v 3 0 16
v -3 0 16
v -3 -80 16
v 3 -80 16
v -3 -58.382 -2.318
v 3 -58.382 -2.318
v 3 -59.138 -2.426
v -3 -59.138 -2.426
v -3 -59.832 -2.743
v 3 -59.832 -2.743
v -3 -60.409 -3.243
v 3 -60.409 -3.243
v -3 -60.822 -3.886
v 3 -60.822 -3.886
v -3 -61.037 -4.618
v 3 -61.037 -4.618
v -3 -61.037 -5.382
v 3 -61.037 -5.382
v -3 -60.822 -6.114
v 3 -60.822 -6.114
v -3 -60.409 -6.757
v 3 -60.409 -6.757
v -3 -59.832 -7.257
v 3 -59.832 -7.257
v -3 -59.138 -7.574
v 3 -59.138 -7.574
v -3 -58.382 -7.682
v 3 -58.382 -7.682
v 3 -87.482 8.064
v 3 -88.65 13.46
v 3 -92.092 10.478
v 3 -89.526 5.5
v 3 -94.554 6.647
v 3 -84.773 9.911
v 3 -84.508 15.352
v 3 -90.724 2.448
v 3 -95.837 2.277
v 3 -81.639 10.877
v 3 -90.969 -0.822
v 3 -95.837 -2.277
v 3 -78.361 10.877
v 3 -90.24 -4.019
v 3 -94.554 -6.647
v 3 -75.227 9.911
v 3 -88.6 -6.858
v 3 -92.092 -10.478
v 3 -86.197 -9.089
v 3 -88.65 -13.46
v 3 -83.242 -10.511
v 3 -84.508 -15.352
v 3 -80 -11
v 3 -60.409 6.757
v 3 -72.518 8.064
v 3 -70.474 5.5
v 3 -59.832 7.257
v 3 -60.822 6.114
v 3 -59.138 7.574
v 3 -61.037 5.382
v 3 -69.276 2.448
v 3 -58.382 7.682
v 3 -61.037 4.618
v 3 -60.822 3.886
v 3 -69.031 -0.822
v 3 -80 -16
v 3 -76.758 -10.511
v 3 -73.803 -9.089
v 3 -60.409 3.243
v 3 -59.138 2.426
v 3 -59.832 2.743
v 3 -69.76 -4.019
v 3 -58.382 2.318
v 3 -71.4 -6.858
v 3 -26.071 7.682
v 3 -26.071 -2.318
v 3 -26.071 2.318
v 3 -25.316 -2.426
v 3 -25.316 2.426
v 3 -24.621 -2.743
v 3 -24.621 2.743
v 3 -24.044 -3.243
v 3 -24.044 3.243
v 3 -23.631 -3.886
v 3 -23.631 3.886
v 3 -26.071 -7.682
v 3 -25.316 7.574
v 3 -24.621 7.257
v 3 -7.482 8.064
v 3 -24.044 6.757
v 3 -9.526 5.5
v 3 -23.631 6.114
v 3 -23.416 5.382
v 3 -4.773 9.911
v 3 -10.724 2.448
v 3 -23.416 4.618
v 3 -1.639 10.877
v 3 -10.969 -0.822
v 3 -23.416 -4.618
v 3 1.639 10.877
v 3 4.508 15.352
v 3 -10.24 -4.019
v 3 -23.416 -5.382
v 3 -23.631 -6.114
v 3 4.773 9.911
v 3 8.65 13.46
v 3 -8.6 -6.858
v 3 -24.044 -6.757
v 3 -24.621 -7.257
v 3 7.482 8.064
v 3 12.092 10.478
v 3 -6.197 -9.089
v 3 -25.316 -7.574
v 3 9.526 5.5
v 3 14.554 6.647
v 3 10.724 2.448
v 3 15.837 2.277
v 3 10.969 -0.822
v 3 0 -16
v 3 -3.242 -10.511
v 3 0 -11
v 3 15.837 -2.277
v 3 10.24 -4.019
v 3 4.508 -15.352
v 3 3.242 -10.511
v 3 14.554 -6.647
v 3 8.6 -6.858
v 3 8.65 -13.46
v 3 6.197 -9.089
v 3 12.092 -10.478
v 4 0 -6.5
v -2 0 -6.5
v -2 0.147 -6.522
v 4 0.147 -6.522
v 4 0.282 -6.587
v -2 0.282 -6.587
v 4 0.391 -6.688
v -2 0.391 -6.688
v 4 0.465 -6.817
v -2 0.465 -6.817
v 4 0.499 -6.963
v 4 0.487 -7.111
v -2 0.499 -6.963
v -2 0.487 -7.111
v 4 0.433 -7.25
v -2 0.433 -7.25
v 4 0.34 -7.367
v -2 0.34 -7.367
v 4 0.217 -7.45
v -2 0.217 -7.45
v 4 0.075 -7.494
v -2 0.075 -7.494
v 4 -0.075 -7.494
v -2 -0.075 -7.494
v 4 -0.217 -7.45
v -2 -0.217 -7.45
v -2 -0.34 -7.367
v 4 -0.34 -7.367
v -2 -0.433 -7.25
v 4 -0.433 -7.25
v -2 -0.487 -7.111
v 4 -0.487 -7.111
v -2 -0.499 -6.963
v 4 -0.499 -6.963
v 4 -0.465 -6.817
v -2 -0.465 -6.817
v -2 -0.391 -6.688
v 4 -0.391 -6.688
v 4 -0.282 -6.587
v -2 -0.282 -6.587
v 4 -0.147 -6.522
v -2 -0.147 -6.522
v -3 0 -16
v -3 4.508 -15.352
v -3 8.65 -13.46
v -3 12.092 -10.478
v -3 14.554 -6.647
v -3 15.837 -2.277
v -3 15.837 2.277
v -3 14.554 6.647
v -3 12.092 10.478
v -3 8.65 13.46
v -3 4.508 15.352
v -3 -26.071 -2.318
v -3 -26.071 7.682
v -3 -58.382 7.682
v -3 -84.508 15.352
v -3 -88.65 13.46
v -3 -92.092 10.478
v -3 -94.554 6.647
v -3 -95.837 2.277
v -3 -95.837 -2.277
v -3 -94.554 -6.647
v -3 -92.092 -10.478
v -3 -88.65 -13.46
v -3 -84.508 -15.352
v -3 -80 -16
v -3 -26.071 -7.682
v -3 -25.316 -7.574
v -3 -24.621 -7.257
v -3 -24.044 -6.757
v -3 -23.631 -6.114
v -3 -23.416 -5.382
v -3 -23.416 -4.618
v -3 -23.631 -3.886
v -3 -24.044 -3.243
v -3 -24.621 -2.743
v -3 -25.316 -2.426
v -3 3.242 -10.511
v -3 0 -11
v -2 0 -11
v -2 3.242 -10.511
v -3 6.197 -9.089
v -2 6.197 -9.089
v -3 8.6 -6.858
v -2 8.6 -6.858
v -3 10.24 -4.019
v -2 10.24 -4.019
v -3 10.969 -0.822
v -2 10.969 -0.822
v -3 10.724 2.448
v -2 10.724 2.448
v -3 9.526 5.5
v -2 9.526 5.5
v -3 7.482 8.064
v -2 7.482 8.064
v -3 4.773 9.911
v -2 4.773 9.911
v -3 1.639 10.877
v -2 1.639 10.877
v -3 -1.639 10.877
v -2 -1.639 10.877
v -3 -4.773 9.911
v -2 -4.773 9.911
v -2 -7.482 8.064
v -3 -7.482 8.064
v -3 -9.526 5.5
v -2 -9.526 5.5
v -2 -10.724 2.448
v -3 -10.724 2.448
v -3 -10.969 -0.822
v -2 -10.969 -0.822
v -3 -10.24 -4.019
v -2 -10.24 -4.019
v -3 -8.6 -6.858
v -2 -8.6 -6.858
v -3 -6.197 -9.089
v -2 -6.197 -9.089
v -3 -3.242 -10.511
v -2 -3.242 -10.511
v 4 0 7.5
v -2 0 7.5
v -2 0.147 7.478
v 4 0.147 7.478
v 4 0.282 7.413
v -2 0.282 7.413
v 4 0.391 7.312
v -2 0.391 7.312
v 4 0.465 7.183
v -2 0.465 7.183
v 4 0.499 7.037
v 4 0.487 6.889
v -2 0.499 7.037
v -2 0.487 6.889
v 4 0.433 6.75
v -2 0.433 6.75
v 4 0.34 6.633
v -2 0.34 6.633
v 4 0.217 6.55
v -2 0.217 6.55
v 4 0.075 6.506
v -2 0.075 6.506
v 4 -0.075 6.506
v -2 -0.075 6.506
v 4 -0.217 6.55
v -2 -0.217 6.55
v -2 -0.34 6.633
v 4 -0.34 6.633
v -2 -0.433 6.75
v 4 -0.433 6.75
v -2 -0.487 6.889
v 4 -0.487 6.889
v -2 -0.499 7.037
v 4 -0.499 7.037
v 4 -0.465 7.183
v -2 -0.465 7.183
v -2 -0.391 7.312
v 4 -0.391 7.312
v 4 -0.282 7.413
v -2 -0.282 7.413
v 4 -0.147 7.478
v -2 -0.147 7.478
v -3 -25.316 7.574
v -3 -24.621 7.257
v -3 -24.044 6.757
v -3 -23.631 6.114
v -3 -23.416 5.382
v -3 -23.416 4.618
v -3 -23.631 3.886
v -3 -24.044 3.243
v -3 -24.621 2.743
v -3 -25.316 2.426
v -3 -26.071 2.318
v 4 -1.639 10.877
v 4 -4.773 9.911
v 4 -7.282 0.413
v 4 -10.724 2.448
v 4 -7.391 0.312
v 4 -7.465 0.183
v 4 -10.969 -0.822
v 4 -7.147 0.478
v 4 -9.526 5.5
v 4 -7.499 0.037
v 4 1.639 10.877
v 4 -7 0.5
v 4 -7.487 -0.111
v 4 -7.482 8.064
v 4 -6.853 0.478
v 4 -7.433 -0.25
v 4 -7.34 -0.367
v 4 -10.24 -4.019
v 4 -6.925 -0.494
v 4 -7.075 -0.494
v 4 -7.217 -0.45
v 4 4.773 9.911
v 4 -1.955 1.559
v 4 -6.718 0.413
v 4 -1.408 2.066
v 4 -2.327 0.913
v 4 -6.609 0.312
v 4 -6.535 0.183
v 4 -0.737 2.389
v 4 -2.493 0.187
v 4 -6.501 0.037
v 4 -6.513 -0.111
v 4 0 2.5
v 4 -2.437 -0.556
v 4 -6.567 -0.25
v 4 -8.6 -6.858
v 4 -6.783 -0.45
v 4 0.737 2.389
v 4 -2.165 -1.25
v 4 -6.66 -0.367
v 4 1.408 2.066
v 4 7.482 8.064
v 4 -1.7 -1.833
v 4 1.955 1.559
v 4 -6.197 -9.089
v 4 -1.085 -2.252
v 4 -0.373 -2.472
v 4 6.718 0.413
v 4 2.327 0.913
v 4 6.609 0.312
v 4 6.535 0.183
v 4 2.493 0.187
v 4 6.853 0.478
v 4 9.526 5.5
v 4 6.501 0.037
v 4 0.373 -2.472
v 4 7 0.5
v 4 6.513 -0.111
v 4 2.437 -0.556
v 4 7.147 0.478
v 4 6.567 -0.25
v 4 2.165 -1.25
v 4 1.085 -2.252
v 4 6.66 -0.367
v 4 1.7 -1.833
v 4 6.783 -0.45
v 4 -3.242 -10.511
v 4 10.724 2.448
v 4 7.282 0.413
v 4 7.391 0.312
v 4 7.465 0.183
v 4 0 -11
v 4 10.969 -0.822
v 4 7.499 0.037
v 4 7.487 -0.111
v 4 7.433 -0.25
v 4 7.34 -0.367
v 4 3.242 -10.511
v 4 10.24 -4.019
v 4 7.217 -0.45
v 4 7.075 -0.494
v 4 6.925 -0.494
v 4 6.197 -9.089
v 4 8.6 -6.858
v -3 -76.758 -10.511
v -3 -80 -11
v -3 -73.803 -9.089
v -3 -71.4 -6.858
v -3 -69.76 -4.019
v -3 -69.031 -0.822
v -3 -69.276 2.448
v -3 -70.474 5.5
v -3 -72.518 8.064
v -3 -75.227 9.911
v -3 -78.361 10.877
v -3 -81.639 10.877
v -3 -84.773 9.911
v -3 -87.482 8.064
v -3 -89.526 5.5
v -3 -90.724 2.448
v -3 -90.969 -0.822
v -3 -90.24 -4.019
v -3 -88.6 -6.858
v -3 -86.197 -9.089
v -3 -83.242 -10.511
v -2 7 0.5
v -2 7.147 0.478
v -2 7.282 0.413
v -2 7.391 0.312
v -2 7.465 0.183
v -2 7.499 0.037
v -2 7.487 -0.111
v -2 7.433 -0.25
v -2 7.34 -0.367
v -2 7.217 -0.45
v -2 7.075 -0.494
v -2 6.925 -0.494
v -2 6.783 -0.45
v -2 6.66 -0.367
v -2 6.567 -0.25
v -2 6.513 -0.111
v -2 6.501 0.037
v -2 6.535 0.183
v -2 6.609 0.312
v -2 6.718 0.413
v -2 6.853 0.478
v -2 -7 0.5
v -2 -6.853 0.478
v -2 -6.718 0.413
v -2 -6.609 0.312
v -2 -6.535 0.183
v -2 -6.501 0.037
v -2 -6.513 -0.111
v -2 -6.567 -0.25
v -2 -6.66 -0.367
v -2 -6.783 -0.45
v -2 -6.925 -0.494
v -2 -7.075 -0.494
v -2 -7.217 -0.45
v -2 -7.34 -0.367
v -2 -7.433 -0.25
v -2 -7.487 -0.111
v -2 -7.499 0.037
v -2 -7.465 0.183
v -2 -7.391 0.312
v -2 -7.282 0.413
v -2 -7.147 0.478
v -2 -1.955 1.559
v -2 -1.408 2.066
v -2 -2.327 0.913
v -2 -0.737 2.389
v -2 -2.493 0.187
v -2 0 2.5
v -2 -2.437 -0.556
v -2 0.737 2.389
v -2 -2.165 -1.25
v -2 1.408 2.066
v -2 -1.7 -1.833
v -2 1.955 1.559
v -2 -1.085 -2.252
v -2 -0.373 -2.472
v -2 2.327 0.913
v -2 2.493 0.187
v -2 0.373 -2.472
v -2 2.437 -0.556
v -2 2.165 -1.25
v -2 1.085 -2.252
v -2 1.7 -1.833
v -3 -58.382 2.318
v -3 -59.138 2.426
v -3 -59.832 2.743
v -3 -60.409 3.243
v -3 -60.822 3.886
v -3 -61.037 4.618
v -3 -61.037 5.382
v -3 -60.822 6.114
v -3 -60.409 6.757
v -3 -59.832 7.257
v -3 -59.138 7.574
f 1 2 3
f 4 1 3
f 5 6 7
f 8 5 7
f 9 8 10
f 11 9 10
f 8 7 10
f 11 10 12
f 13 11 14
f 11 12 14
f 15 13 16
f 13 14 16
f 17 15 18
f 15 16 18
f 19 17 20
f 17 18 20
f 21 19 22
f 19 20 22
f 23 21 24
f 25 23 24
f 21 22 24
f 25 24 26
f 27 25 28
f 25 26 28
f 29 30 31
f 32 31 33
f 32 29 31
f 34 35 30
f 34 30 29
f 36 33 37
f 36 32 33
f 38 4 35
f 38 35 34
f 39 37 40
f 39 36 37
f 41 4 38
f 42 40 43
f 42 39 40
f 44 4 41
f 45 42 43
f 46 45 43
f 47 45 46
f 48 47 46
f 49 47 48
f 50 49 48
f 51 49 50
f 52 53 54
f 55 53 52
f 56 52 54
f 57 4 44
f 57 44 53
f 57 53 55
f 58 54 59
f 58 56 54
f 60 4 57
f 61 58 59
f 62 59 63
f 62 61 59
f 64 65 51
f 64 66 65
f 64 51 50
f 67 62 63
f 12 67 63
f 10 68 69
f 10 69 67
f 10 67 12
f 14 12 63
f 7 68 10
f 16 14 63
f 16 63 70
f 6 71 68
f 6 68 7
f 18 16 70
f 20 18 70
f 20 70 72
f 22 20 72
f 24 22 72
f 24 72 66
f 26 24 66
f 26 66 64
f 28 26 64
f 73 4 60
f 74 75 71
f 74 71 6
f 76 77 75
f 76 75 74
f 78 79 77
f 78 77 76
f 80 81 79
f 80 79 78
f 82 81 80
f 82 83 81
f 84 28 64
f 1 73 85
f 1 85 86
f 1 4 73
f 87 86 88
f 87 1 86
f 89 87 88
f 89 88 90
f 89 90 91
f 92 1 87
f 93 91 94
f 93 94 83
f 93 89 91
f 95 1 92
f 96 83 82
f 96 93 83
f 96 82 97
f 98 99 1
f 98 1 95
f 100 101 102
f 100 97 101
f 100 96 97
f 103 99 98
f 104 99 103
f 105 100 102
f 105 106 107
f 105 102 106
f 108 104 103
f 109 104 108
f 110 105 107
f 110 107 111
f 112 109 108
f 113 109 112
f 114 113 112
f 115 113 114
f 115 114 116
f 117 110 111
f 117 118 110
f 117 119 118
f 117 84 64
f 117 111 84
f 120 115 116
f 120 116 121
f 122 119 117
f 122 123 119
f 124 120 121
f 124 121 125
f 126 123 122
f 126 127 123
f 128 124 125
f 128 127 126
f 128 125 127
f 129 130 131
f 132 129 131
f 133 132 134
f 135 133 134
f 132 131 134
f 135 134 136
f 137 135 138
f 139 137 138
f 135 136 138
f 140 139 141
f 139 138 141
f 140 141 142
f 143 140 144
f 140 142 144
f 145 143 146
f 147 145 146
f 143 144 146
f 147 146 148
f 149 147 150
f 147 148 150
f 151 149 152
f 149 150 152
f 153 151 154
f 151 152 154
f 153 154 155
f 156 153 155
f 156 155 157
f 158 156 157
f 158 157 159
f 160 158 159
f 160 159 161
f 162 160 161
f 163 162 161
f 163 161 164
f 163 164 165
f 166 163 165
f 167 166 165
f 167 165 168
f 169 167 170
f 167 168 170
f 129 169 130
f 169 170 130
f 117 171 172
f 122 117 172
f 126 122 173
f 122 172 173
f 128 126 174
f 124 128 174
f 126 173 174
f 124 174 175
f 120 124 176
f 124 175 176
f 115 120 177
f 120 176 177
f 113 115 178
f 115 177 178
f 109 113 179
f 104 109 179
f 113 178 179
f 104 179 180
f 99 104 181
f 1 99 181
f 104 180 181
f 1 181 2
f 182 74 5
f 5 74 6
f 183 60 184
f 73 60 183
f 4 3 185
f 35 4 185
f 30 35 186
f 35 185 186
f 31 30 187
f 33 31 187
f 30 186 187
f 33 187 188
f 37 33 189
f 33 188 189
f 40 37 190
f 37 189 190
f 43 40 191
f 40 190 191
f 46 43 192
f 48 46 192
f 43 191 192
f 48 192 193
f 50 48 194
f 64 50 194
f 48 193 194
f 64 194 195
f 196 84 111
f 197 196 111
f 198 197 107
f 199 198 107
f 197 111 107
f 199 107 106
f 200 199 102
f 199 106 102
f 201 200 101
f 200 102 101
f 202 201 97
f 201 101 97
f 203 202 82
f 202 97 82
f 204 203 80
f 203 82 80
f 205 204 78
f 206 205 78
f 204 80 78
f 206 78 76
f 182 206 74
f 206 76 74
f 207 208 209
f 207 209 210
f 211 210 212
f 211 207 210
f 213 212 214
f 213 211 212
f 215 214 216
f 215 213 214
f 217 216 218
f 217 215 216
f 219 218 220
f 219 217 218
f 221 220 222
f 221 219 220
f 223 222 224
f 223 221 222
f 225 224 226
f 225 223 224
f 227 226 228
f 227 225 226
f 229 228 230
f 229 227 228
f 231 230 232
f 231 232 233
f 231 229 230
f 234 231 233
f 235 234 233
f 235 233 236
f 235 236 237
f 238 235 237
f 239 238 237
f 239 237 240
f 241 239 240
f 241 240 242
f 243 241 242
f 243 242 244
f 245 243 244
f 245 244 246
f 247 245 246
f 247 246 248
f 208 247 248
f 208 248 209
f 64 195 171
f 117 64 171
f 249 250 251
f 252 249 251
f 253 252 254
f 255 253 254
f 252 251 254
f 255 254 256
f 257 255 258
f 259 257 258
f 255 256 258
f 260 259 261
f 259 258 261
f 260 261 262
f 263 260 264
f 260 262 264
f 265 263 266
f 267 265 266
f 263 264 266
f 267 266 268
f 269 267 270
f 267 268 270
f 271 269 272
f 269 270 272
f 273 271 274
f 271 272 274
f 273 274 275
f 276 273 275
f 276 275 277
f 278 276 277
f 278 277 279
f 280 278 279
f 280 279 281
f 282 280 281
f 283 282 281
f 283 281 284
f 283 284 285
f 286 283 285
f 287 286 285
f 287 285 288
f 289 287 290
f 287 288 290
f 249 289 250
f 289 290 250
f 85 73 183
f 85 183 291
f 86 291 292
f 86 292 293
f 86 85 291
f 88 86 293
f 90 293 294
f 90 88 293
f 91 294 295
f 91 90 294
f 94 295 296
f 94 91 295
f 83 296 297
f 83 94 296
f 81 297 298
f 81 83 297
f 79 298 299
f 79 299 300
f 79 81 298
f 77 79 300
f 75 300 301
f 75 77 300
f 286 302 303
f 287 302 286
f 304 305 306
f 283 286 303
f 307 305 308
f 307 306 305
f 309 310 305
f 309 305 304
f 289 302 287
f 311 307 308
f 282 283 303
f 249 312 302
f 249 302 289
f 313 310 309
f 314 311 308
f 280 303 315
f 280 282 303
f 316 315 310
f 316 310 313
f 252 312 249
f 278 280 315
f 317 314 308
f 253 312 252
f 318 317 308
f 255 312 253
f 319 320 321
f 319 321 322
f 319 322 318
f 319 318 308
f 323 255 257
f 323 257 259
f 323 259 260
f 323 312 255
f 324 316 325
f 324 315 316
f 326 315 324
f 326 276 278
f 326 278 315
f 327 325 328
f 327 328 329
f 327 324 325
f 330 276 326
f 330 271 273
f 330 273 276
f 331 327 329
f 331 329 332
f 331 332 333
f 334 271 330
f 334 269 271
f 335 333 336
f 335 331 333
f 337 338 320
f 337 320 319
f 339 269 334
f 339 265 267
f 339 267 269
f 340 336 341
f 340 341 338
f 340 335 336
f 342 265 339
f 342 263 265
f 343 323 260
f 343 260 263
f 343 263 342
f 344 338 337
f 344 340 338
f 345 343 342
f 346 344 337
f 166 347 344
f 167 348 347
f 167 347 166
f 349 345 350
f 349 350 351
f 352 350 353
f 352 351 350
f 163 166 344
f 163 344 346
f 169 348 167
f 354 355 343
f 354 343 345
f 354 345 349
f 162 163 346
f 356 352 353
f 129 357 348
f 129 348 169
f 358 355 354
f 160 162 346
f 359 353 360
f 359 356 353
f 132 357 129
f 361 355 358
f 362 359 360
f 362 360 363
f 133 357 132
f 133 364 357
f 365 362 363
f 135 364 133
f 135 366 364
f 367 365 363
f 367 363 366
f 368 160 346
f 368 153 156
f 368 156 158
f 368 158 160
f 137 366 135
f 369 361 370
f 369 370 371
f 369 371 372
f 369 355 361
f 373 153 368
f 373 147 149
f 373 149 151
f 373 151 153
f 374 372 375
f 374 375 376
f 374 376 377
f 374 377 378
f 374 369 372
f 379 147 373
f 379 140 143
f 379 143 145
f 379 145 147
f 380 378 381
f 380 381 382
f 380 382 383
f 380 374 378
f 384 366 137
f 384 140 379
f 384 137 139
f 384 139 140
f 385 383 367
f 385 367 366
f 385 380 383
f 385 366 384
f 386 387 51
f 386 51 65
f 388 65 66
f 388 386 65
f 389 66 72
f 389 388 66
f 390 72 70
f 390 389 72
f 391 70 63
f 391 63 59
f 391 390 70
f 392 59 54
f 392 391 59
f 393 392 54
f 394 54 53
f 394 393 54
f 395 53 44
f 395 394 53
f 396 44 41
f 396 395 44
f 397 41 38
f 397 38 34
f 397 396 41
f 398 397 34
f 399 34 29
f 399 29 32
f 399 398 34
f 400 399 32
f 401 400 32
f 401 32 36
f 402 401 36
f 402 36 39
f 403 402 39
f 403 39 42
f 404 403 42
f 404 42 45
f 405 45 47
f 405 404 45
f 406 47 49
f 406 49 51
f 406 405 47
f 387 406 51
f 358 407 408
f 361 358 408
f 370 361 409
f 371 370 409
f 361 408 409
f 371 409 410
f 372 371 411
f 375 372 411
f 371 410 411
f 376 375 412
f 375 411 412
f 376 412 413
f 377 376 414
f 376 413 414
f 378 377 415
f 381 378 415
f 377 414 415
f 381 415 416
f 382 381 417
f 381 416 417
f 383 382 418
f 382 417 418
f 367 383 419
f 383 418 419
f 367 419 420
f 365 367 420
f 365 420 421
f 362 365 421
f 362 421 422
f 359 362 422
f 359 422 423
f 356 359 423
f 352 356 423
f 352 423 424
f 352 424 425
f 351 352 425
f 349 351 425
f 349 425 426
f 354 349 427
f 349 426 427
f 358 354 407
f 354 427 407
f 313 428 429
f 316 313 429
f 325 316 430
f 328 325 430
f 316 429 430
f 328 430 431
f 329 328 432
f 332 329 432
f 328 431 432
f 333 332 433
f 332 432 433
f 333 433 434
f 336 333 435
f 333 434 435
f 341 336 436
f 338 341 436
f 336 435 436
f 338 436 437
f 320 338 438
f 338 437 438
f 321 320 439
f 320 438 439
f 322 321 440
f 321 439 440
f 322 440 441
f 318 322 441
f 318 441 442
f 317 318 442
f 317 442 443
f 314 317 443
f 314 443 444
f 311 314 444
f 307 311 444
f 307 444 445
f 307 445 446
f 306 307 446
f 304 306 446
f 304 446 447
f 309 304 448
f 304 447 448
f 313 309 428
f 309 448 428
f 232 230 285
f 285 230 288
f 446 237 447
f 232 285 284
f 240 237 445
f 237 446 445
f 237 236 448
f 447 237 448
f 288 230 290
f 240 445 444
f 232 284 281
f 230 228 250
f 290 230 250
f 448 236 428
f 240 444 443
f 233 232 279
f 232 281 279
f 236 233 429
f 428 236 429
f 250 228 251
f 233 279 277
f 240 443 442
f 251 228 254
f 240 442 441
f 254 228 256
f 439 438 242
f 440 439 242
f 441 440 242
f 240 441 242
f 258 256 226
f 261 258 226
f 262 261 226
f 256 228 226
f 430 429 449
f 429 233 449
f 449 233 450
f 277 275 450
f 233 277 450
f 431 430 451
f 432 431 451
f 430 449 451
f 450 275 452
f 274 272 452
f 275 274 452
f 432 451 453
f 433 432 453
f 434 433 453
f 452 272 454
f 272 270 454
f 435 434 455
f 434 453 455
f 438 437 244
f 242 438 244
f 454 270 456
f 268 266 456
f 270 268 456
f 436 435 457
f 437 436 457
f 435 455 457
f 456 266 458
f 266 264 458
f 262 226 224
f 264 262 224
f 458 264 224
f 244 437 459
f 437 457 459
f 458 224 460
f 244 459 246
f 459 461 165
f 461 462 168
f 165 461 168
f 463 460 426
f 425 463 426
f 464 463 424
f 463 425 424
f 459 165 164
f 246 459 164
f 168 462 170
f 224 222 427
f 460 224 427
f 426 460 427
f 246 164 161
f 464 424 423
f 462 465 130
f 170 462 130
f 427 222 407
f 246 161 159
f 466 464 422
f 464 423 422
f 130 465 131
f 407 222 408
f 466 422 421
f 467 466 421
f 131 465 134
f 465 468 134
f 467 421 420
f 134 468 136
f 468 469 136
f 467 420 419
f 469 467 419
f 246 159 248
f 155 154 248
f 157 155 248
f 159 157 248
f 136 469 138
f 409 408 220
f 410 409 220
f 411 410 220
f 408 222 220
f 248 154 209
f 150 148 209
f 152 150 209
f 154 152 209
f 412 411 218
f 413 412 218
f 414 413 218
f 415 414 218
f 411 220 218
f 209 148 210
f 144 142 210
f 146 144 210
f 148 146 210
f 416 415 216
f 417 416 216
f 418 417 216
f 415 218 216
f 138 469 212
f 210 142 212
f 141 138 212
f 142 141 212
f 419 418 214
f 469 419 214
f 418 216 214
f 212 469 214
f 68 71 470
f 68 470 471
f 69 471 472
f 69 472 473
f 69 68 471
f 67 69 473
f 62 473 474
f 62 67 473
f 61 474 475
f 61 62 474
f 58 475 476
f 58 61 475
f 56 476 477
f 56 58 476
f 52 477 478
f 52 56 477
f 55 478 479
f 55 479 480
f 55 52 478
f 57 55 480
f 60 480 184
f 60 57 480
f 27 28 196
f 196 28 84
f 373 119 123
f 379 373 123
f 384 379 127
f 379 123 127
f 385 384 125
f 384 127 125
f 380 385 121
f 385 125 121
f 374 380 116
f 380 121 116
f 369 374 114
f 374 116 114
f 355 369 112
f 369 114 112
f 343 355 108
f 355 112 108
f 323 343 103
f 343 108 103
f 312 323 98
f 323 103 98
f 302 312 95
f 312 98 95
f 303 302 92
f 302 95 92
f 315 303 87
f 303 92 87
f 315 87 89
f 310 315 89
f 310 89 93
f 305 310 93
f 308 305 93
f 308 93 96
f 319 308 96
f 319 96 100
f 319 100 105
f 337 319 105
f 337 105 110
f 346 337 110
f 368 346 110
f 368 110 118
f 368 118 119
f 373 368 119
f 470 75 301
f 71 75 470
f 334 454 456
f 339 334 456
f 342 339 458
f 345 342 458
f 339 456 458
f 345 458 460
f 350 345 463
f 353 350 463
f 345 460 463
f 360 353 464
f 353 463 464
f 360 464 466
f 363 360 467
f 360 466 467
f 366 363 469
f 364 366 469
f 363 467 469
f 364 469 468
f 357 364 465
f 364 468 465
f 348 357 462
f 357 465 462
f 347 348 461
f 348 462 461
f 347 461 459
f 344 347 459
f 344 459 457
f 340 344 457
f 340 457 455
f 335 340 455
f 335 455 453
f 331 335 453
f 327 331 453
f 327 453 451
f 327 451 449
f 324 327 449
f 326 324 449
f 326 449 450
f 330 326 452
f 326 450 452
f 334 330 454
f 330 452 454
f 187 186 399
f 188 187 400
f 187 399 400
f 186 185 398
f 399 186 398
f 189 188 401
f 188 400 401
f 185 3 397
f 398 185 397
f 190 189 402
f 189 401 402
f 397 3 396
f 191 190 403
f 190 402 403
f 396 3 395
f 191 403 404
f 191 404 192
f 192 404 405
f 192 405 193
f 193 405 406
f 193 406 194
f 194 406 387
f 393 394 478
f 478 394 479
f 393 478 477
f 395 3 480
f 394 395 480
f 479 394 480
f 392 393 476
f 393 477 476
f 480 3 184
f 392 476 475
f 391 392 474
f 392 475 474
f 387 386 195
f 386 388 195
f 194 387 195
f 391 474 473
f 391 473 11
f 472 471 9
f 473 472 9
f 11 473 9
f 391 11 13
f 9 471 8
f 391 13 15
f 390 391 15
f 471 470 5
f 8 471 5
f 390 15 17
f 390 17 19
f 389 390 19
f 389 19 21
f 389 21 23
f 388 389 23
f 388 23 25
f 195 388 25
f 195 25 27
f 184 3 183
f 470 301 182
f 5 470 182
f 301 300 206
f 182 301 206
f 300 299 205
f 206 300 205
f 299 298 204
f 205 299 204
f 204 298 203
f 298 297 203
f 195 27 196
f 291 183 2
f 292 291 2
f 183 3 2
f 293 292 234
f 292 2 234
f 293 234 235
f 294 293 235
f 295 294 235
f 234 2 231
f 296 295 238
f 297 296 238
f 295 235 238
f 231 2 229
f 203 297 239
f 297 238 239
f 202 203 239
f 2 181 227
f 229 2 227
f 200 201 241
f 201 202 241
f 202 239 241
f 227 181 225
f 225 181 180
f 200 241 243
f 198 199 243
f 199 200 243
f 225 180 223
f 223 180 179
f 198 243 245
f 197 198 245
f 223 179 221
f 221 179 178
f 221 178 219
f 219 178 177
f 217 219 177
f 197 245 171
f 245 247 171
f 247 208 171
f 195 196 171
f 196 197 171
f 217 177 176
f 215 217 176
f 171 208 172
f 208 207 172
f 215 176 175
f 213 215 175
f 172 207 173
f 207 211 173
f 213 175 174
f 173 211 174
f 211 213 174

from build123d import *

# Parameters (mm, degrees)
BOSS_EXTRUDE1_DEPTH      = 3
BOSS_EXTRUDE1_DEPTH_BACK = 3
SKETCH1_R                = 11
BOSS_EXTRUDE2_DEPTH      = 4
BOSS_EXTRUDE2_DEPTH_BACK = 2
SKETCH1_2_R              = 11
CUT_EXTRUDE1_DEPTH       = 6
SKETCH3_R                = 2.5
SKETCH3_R_2              = 0.5
CUT_EXTRUDE2_DEPTH       = 6


with BuildPart() as part:
    # Sketch1 → Boss-Extrude1 (new, two sides: drawn at the far end of the back side and taken through both)
    with BuildSketch(Plane(origin=(0, 0, 0), x_dir=(0, 0, -1), z_dir=(1, 0, 0)).offset(-BOSS_EXTRUDE1_DEPTH_BACK)):
        with BuildLine():
            Line((-16, 0), (-16, -80))
            ThreePointArc((-16, -80), (0, -96), (16, -80))
            Line((16, -80), (16, 0))
            ThreePointArc((16, 0), (0, 16), (-16, 0))
        make_face()
        Circle(SKETCH1_R, mode=Mode.SUBTRACT)
        with Locations((0, -80)):
            Circle(SKETCH1_R, mode=Mode.SUBTRACT)
    extrude(amount=BOSS_EXTRUDE1_DEPTH + BOSS_EXTRUDE1_DEPTH_BACK)

    # Sketch1<2> → Boss-Extrude2 (add, two sides: drawn at the far end of the back side and taken through both)
    with BuildSketch(Plane(origin=(0, 0, 0), x_dir=(0, 0, -1), z_dir=(1, 0, 0)).offset(-BOSS_EXTRUDE2_DEPTH_BACK)):
        Circle(SKETCH1_2_R)
    extrude(amount=BOSS_EXTRUDE2_DEPTH + BOSS_EXTRUDE2_DEPTH_BACK)

    # Sketch2 → Cut-Extrude1 (cut)
    with BuildSketch(Plane(origin=(3, 0, 0), x_dir=(0, 0, -1), z_dir=(1, 0, 0))):
        with BuildLine():
            Line((-2.317597737, -26.071446828), (-2.317597737, -58.382201359))
            ThreePointArc((-2.317597737, -58.382201359), (-5, -61.064603622), (-7.682402263, -58.382201359))
            Line((-7.682402263, -58.382201359), (-7.682402263, -26.071446828))
            ThreePointArc((-7.682402263, -26.071446828), (-5, -23.389044565), (-2.317597737, -26.071446828))
        make_face()
        with BuildLine():
            Line((2.317597737, -26.071446828), (2.317597737, -58.382201359))
            ThreePointArc((2.317597737, -58.382201359), (5, -61.064603622), (7.682402263, -58.382201359))
            Line((7.682402263, -58.382201359), (7.682402263, -26.071446828))
            ThreePointArc((7.682402263, -26.071446828), (5, -23.389044565), (2.317597737, -26.071446828))
        make_face()
    extrude(amount=-CUT_EXTRUDE1_DEPTH, mode=Mode.SUBTRACT)

    # Sketch3 → Cut-Extrude2 (cut)
    with BuildSketch(Plane.ZY.offset(2)):
        Circle(SKETCH3_R)
        with Locations((0, 7)):
            Circle(SKETCH3_R_2)
        with Locations((-7, 0)):
            Circle(SKETCH3_R_2)
        with Locations((7, 0)):
            Circle(SKETCH3_R_2)
        with Locations((0, -7)):
            Circle(SKETCH3_R_2)
    extrude(amount=-CUT_EXTRUDE2_DEPTH, mode=Mode.SUBTRACT)


solid = part.part
